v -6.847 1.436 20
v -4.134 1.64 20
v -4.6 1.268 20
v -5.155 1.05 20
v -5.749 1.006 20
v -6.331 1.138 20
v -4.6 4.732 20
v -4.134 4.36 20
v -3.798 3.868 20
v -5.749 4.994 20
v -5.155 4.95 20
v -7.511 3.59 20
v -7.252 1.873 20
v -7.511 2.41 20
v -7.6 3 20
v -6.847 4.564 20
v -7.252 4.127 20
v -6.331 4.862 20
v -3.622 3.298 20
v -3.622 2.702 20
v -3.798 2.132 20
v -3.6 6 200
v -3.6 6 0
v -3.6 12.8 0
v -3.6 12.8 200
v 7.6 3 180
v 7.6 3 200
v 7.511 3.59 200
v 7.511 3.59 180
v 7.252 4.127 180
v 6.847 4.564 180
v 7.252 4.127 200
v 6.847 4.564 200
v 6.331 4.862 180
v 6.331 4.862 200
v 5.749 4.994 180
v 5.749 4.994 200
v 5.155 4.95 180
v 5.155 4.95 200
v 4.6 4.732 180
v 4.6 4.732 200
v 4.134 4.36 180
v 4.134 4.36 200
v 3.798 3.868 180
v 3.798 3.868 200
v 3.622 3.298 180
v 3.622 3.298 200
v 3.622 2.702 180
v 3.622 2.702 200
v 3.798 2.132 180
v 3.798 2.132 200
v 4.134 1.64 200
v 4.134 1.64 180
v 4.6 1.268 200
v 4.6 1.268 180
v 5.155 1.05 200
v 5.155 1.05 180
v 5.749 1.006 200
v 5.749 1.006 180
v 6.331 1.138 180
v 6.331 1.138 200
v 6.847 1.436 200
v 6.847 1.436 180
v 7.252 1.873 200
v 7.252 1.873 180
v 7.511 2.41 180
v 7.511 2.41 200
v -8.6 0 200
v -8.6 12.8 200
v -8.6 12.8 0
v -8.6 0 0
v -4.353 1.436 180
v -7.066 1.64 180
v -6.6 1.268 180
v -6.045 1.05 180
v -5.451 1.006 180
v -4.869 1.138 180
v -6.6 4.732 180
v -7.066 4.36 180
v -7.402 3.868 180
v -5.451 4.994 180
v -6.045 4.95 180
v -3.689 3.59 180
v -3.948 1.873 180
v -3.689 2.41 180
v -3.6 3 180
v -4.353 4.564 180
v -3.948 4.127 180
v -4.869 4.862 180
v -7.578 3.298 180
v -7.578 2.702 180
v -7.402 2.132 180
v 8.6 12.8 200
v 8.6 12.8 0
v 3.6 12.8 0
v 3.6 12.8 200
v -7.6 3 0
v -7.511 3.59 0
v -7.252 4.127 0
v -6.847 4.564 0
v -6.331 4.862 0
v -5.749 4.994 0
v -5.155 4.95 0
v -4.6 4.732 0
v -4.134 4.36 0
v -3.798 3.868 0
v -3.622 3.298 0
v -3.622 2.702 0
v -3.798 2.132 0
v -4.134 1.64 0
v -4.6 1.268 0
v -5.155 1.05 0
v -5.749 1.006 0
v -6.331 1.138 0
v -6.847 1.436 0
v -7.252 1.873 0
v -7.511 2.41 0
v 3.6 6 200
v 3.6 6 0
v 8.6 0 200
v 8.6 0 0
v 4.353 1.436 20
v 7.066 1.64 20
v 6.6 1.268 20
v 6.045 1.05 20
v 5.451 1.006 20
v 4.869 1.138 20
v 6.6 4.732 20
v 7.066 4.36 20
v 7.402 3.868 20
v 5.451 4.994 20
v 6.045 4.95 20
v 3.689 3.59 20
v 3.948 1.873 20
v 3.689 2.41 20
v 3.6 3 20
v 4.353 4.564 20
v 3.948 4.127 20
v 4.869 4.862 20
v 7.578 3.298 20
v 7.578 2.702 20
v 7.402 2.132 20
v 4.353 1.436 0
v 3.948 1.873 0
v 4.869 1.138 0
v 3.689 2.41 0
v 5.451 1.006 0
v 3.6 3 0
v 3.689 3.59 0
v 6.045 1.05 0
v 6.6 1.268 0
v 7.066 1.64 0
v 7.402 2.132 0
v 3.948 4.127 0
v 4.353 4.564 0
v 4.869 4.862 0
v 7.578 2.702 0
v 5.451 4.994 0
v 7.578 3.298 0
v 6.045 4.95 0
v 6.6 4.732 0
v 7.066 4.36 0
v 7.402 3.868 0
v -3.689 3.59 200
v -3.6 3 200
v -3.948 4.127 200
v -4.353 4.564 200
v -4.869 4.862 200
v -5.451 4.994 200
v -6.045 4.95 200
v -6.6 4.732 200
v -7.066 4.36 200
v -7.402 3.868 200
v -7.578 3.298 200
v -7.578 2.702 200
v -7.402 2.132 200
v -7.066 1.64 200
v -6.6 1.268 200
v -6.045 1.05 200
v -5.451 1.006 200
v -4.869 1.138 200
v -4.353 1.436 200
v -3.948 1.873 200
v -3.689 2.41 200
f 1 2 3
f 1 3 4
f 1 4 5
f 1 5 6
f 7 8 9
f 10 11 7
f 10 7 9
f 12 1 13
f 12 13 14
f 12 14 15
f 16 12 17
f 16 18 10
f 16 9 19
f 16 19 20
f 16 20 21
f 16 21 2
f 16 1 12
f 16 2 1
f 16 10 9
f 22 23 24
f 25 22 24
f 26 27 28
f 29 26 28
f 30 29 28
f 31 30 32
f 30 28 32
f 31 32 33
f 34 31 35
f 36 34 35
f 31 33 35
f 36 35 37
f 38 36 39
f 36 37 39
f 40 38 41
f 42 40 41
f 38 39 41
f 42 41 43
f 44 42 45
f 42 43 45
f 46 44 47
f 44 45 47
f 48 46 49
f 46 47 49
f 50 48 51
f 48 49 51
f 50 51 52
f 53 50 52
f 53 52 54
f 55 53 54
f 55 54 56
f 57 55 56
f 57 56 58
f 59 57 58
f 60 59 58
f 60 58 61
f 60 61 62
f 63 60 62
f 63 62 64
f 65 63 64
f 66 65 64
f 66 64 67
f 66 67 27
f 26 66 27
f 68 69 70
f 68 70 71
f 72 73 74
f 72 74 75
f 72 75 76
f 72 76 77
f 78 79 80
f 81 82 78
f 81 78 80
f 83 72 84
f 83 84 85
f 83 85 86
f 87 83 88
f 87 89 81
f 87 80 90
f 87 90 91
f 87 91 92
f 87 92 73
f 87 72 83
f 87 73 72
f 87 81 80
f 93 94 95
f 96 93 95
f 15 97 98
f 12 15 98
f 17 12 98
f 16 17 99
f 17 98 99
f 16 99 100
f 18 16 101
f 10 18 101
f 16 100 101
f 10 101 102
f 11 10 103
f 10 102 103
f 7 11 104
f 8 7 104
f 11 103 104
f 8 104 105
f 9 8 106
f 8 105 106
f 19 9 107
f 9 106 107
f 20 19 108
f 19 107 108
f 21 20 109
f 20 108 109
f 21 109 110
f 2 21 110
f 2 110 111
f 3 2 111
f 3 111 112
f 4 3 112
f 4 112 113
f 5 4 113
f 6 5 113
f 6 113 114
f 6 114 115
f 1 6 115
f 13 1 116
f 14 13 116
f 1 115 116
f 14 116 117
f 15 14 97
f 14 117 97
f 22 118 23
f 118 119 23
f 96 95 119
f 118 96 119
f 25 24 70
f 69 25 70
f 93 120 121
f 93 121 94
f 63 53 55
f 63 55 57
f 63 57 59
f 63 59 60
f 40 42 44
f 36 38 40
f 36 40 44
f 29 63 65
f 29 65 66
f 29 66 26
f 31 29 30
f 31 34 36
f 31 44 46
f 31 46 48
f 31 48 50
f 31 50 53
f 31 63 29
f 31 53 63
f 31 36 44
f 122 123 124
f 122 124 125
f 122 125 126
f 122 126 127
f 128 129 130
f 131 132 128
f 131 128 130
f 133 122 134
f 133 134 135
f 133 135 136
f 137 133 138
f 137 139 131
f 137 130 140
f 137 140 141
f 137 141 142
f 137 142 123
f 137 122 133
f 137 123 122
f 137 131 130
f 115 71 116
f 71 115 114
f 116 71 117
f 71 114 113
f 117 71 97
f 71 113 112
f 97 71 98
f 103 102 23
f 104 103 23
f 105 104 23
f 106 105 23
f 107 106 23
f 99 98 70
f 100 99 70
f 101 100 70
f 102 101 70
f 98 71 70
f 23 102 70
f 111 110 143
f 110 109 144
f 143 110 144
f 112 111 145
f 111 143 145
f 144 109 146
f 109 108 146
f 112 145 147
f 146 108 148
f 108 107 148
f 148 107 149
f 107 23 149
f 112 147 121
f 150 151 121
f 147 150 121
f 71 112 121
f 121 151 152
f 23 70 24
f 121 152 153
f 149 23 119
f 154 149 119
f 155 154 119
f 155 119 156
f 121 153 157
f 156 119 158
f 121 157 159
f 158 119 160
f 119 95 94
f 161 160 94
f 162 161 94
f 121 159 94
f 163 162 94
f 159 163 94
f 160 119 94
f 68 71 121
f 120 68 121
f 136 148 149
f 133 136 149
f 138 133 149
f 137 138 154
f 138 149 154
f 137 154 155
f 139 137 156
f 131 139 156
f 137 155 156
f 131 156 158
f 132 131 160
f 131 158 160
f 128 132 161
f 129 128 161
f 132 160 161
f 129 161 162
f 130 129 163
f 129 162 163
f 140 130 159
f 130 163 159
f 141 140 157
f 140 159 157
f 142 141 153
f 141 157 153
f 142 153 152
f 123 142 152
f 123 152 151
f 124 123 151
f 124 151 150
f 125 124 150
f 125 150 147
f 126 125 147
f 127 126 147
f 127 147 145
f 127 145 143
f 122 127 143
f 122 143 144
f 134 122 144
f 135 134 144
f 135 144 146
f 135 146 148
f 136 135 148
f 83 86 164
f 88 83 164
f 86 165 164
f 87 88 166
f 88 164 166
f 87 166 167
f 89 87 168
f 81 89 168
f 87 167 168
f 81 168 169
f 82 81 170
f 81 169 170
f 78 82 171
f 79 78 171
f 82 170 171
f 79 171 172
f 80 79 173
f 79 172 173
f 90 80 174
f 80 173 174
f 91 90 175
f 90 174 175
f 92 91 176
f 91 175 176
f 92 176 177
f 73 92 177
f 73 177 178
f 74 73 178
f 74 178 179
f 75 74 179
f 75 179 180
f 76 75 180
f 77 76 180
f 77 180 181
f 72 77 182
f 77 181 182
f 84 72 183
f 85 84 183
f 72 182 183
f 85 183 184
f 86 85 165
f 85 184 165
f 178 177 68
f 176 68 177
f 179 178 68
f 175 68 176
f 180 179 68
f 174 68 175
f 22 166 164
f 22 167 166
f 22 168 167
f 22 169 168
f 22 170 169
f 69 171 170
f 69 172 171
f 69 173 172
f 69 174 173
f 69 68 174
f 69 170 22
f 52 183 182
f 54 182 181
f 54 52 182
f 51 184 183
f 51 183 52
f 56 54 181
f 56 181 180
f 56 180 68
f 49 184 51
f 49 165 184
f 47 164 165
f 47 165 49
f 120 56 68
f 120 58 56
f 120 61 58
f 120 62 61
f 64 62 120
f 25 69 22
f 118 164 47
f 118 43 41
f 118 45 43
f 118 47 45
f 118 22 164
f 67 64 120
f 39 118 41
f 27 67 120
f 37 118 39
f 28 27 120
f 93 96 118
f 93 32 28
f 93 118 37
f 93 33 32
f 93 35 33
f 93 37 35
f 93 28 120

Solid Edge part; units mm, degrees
sketch "Sketch1" plane through (0, 0, 0) normal (0, 0, 1) x (1, 0, 0)
  line L0 (8.6, 0) -> (8.6, 12.8)
  line L1 (8.6, 12.8) -> (3.6, 12.8)
  line L2 (3.6, 12.8) -> (3.6, 6)
  line L3 (3.6, 6) -> (-3.6, 6)
  line L4 (-3.6, 6) -> (-3.6, 12.8)
  line L5 (-3.6, 12.8) -> (-8.6, 12.8)
  line L6 (-8.6, 12.8) -> (-8.6, 0)
  line L7 (-8.6, 0) -> (8.6, 0)
extrude "Protrusion1" add sketch "Sketch1" along normal blind 200
sketch "Sketch2" plane through (0, 5.9, 200) normal (0, 0, 1) x (1, 0, 0)
  circle A0 centre (-5.6, -2.9) radius 2
  circle A1 centre (5.6, -2.9) radius 2
extrude "ExtrudedCutout_1" cut sketch "Sketch2" against normal blind 20
sketch "Sketch3" plane through (0, 5.9, 0) normal (0, 0, -1) x (-1, 0, 0)
  circle A0 centre (-5.6, -2.9) radius 2
  circle A1 centre (5.6, -2.9) radius 2
extrude "ExtrudedCutout_2" cut sketch "Sketch3" against normal blind 20
